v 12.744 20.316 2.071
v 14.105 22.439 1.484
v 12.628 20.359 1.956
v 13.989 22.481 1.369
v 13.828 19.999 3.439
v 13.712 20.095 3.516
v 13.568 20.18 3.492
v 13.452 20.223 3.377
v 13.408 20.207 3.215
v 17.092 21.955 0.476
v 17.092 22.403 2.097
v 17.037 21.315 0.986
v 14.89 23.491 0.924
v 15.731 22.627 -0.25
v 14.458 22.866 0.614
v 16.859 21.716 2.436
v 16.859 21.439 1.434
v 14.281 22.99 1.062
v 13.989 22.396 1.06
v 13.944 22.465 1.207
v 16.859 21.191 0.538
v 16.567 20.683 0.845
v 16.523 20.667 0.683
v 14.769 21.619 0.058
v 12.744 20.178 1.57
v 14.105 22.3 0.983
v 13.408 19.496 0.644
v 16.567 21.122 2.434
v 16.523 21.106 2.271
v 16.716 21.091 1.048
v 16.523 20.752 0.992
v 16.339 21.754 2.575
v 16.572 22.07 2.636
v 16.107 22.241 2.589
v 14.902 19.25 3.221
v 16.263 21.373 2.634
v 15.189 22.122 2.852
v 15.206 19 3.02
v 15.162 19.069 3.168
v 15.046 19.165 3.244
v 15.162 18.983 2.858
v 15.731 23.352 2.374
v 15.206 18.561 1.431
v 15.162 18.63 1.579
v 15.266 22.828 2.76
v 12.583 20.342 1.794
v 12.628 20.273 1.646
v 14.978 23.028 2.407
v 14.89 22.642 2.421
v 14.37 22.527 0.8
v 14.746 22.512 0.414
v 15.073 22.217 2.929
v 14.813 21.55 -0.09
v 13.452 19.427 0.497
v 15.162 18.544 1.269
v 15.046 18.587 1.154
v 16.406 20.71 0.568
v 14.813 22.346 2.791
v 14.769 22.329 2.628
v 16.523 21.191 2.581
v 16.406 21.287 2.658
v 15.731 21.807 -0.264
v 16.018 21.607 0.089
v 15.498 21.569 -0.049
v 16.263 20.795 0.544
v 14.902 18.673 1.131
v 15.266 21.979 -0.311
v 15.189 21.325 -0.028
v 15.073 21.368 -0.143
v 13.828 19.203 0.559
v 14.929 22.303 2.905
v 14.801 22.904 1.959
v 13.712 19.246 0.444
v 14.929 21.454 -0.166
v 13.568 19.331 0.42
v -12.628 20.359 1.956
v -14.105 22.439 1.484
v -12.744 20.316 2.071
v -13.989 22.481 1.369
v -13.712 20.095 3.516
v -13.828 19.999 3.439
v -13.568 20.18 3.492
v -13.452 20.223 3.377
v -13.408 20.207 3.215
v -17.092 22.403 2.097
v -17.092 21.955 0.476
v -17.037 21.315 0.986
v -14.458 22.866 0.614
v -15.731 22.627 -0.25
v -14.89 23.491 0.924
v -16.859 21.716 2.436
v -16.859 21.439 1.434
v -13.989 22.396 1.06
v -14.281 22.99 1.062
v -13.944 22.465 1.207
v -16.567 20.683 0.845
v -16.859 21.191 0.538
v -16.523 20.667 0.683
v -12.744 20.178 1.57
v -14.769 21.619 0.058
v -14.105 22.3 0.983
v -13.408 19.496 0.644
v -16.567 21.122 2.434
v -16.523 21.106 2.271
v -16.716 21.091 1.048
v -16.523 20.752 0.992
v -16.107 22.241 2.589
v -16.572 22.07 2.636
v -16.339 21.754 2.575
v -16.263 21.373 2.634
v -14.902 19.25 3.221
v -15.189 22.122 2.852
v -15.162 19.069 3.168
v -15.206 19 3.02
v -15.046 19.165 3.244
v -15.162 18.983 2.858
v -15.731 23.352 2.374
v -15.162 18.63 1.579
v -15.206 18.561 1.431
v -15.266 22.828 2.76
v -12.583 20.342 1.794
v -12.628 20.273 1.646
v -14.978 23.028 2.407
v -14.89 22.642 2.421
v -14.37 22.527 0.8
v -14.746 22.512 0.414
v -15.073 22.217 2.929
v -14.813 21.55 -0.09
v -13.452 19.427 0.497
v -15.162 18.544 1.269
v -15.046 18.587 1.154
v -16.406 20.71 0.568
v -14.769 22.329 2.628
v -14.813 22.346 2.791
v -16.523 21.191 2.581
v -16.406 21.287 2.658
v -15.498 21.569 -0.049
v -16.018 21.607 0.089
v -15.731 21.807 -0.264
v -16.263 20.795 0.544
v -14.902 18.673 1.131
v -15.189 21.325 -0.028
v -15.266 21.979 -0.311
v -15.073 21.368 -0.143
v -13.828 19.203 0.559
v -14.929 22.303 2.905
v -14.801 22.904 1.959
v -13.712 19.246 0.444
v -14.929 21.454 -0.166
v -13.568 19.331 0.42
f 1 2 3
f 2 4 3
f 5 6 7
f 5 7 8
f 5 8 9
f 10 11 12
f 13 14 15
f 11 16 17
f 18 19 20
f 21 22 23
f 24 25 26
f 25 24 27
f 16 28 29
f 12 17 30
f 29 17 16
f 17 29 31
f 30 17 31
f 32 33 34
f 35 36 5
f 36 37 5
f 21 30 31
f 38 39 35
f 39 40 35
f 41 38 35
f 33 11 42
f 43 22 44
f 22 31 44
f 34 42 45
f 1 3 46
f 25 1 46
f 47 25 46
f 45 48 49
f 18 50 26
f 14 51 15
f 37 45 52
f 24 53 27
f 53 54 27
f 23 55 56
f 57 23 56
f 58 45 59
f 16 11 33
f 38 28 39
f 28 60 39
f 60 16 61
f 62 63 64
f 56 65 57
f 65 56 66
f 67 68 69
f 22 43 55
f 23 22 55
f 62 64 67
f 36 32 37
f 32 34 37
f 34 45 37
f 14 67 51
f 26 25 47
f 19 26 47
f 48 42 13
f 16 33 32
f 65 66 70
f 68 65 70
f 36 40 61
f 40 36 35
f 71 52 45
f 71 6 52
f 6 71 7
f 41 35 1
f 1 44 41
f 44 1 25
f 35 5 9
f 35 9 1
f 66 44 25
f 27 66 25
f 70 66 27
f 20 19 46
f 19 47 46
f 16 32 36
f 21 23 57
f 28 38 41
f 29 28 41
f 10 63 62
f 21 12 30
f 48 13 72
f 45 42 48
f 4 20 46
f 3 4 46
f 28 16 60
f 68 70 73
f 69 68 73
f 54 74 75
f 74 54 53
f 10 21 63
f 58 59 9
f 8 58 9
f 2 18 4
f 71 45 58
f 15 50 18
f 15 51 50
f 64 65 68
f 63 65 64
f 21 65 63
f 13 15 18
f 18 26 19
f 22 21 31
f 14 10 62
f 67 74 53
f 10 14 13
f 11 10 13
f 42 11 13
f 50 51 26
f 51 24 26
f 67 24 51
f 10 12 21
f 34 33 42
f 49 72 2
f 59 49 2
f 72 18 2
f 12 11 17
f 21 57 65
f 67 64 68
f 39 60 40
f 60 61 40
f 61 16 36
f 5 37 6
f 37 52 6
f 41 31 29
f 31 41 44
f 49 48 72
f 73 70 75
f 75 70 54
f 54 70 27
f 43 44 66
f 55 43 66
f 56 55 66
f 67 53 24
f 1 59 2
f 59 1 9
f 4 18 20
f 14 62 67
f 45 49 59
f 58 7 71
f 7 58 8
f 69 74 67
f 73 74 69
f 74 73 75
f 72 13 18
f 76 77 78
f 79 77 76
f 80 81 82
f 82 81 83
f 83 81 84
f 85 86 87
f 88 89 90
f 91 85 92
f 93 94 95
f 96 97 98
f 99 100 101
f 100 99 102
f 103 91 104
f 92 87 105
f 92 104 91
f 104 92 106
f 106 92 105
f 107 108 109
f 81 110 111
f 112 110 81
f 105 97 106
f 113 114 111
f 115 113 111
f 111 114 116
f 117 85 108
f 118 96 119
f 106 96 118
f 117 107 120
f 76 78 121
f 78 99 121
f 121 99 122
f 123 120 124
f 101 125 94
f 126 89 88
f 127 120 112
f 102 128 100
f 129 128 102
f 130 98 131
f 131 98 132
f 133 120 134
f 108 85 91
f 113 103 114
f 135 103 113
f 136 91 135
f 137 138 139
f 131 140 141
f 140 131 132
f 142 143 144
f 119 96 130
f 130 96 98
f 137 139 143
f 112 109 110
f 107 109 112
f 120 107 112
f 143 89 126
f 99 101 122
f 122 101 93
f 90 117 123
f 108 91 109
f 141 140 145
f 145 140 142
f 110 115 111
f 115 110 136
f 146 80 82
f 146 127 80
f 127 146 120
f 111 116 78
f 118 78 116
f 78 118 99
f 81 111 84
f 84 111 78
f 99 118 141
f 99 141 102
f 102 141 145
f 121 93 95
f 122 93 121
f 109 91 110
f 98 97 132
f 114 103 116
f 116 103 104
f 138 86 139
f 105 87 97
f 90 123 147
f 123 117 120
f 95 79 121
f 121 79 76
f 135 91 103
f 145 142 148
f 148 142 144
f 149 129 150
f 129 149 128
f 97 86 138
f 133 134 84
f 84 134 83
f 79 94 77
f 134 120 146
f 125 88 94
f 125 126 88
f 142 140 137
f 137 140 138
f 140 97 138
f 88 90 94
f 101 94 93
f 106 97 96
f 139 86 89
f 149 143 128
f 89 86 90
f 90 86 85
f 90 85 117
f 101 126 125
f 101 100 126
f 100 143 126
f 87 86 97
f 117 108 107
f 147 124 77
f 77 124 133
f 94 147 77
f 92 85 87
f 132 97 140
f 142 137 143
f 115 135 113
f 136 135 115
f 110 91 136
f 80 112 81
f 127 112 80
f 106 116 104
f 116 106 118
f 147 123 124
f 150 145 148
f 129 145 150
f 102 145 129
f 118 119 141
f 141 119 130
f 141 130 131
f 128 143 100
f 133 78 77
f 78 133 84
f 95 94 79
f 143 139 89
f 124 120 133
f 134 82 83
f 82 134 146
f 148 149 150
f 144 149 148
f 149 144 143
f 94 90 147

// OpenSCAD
sc=(4+2*sqrt(5))/cos(16.5);
points=[[ -6.500960, -2.446784, 9.041020 ], [ -6.448337, -2.420473, 8.972136 ], [ -6.442126, -2.377901, 9.041020 ], [ -6.405765, -2.600813, 9.099853 ], [ -6.405765, -2.351589, 9.083592 ], [ -6.405765, -2.292756, 9.290243 ], [ -6.379454, -2.568291, 9.024758 ], [ -6.379454, -2.531929, 9.014708 ], [ -6.336881, -2.600813, 9.041020 ], [ -6.336881, -2.240133, 9.263932 ], [ -6.320620, -2.282706, 9.296454 ], [ -6.310570, -2.446784, 9.349077 ], [ -6.294309, -2.309017, 9.290243 ], [ -6.267997, -2.489357, 9.221360 ], [ -6.257947, -2.473096, 9.280193 ], [ -6.225425, -2.420473, 9.332816 ], [ -6.225425, -2.309017, 8.680340 ], [ -6.156541, -2.309017, 8.791796 ], [ -6.095085, -2.098936, 7.823200 ], [ -6.045085, -2.600813, 8.791796 ], [ -6.045085, -2.489357, 8.860680 ], [ -6.045085, -2.128677, 9.083592 ], [ -6.045085, -2.017221, 9.152476 ], [ -5.933629, -2.309017, 9.152476 ], [ -5.864745, -2.309017, 9.263932 ], [ -5.795085, -2.449593, 7.862712 ], [ -5.795085, -1.977458, 8.154508 ], [ -5.495085, -2.328115, 8.194021 ], [ 0.000000, -5.236068, 18.944272 ], [ 0.000000, 0.000000, 0.000000 ], [ 0.000000, 9.472136, 2.618034 ], [ 0.759017, 0.519098, -1.648936 ], [ 1.059017, 0.168441, -1.609424 ], [ 1.059017, 0.640576, -1.317627 ], [ 1.309017, 0.809017, -2.236068 ], [ 1.359017, 0.289919, -1.278115 ], [ 1.424109, 0.809017, -2.164937 ], [ 1.429134, 0.790836, -2.161831 ], [ 1.429134, 0.827198, -2.161831 ], [ 1.442290, 0.779600, -2.153701 ], [ 1.442290, 0.838434, -2.153701 ], [ 1.500000, 0.500000, -2.118034 ], [ 1.500000, 1.118034, -2.118034 ], [ 1.517385, 0.658094, -2.107290 ], [ 1.517385, 0.959940, -2.107290 ], [ 1.522410, 0.639913, -2.104184 ], [ 1.522410, 0.978121, -2.104184 ], [ 1.535565, 0.628677, -2.096053 ], [ 1.535565, 0.989357, -2.096053 ], [ 1.551827, 0.628677, -2.086003 ], [ 1.551827, 0.989357, -2.086003 ], [ 1.564982, 0.639913, -2.077873 ], [ 1.564982, 0.978121, -2.077873 ], [ 1.578138, 0.809017, -2.414161 ], [ 1.583163, 0.790836, -2.411055 ], [ 1.583163, 0.827198, -2.411055 ], [ 1.596319, 0.779600, -2.402924 ], [ 1.596319, 0.838434, -2.402924 ], [ 1.616216, 0.809017, -2.475772 ], [ 1.626266, 0.766445, -2.433200 ], [ 1.636316, 0.756395, -2.475772 ], [ 1.668838, 0.723872, -2.443250 ], [ 1.671414, 0.658094, -2.356513 ], [ 1.671414, 0.959940, -2.356513 ], [ 1.675050, 0.904212, -2.439411 ], [ 1.676439, 0.639913, -2.353408 ], [ 1.676439, 0.978121, -2.353408 ], [ 1.685100, 0.809017, -2.534606 ], [ 1.685100, 0.946784, -2.396838 ], [ 1.686489, 0.686325, -2.002778 ], [ 1.686489, 0.931709, -2.002778 ], [ 1.689594, 0.628677, -2.345277 ], [ 1.689594, 0.989357, -2.345277 ], [ 1.695150, 0.956834, -2.439411 ], [ 1.702750, 0.686325, -1.992728 ], [ 1.702750, 0.931709, -1.992728 ], [ 1.705855, 0.628677, -2.335227 ], [ 1.705855, 0.989357, -2.335227 ], [ 1.715905, 0.697561, -1.984597 ], [ 1.715905, 0.733922, -1.984597 ], [ 1.715905, 0.884112, -1.984597 ], [ 1.715905, 0.920473, -1.984597 ], [ 1.719011, 0.639913, -2.327096 ], [ 1.719011, 0.978121, -2.327096 ], [ 1.720930, 0.715741, -1.981492 ], [ 1.720930, 0.902293, -1.981492 ], [ 1.727672, 0.628677, -2.406888 ], [ 1.727672, 0.989357, -2.406888 ], [ 1.753983, 0.644938, -2.354266 ], [ 1.780295, 0.628677, -2.386788 ], [ 1.780295, 0.654988, -2.475772 ], [ 1.780295, 0.963046, -2.475772 ], [ 1.809017, 0.618034, -1.927051 ], [ 1.809017, 1.000000, -1.927051 ], [ 1.812817, 0.661200, -2.354266 ], [ 1.822867, 0.952996, -2.348055 ], [ 1.840517, 0.686325, -2.252001 ], [ 1.840517, 0.931709, -2.252001 ], [ 1.849178, 0.936734, -2.295432 ], [ 1.856778, 0.686325, -2.241951 ], [ 1.856778, 0.931709, -2.241951 ], [ 1.869934, 0.697561, -2.233821 ], [ 1.869934, 0.733922, -2.233821 ], [ 1.869934, 0.884112, -2.233821 ], [ 1.869934, 0.920473, -2.233821 ], [ 1.874959, 0.715741, -2.230715 ], [ 1.874959, 0.902293, -2.230715 ], [ 1.875490, 0.952996, -2.327955 ], [ 1.891751, 0.750183, -2.269121 ], [ 1.908012, 0.697561, -2.295432 ], [ 1.908012, 0.802806, -2.295432 ], [ 1.908012, 0.920473, -2.295432 ], [ 1.928112, 0.750183, -2.295432 ], [ 1.934323, 0.713822, -2.380577 ], [ 1.934323, 0.904212, -2.380577 ], [ 2.118034, 0.809017, -2.927051 ]];

X=9.472136;
Y=2.618034;

module strut() {
rotate ([atan2(X,Y),0,0]) scale(sc) {
color("#FFB31A") polyhedron(points,faces=[[ 55, 57, 40, 38 ],[ 44, 46, 48, 50, 52 ],[ 112, 114, 113 ],[ 60, 90, 67 ],[ 111, 114, 110 ],[ 58, 53, 54 ],[ 109, 101, 105 ],[ 62, 56, 39, 43 ],[ 111, 103, 106 ],[ 108, 110, 112 ],[ 110, 108, 102, 103, 111 ],[ 98, 95, 107 ],[ 83, 97, 70, 52 ],[ 108, 109, 102 ],[ 70, 75, 81, 85, 80 ],[ 107, 91, 114 ],[ 102, 105, 84, 79 ],[ 87, 91, 95 ],[ 39, 37, 36, 38, 40 ],[ 73, 87, 68 ],[ 59, 58, 56 ],[ 61, 90, 60 ],[ 87, 83, 77 ],[ 65, 62, 43, 45 ],[ 101, 99, 74, 78 ],[ 87, 66, 63 ],[ 114, 111, 107 ],[ 104, 106, 85, 81 ],[ 111, 104, 100 ],[ 88, 94, 89 ],[ 99, 96, 69, 74 ],[ 86, 76, 82 ],[ 105, 101, 78, 84 ],[ 89, 86, 88 ],[ 95, 98, 97, 83, 87 ],[ 86, 90, 61 ],[ 56, 54, 37, 39 ],[ 73, 67, 91 ],[ 107, 111, 98 ],[ 96, 82, 51, 69 ],[ 97, 100, 75, 70 ],[ 72, 77, 50, 48 ],[ 70, 80, 79, 69, 51, 43, 39, 40, 44, 52 ],[ 54, 53, 36, 37 ],[ 98, 111, 97 ],[ 109, 99, 101 ],[ 106, 103, 80, 85 ],[ 94, 113, 89 ],[ 112, 109, 108 ],[ 64, 67, 73 ],[ 91, 87, 73 ],[ 53, 55, 38, 36 ],[ 111, 106, 104 ],[ 82, 76, 49, 51 ],[ 71, 65, 45, 47 ],[ 109, 113, 94 ],[ 63, 66, 46, 44 ],[ 58, 57, 55 ],[ 87, 72, 66 ],[ 60, 58, 59 ],[ 59, 61, 60 ],[ 94, 88, 82, 96, 109 ],[ 67, 58, 60 ],[ 58, 54, 56 ],[ 109, 105, 102 ],[ 86, 71, 76 ],[ 89, 113, 90 ],[ 86, 65, 71 ],[ 114, 91, 67, 90, 113 ],[ 61, 59, 56, 62, 86 ],[ 113, 109, 112 ],[ 95, 91, 107 ],[ 64, 68, 63, 57, 58 ],[ 110, 114, 112 ],[ 109, 96, 99 ],[ 87, 77, 72 ],[ 88, 86, 82 ],[ 100, 104, 81, 75 ],[ 111, 100, 97 ],[ 77, 83, 52, 50 ],[ 103, 102, 79, 80 ],[ 68, 64, 73 ],[ 51, 49, 47, 45, 43 ],[ 79, 84, 78, 74, 69 ],[ 86, 62, 65 ],[ 57, 63, 44, 40 ],[ 58, 55, 53 ],[ 90, 86, 89 ],[ 68, 87, 63 ],[ 66, 72, 48, 46 ],[ 76, 71, 47, 49 ],[ 58, 67, 64 ]]);
color("#7D36D3") polyhedron(points,faces=[[ 23, 15, 12 ],[ 23, 21, 17, 20 ],[ 21, 12, 9 ],[ 20, 17, 7 ],[ 15, 23, 13 ],[ 17, 21, 4 ],[ 2, 4, 5 ],[ 5, 10, 11 ],[ 1, 17, 4 ],[ 5, 0, 2 ],[ 6, 7, 0 ],[ 7, 1, 0 ],[ 14, 13, 3 ],[ 11, 15, 14 ],[ 2, 1, 4 ],[ 9, 10, 5 ],[ 3, 11, 14 ],[ 17, 1, 7 ],[ 13, 8, 3 ],[ 4, 21, 9 ],[ 14, 15, 13 ],[ 20, 7, 8 ],[ 10, 12, 11 ],[ 23, 20, 13 ],[ 3, 6, 0 ],[ 8, 6, 3 ],[ 6, 8, 7 ],[ 4, 9, 5 ],[ 10, 9, 12 ],[ 5, 11, 3, 0 ],[ 21, 23, 12 ],[ 13, 20, 8 ],[ 12, 15, 11 ],[ 0, 1, 2 ]]);
color("#00993F") polyhedron(points,faces=[[ 31, 32, 34 ],[ 16, 22, 24, 19 ],[ 18, 16, 25 ],[ 33, 42, 93 ],[ 42, 31, 34 ],[ 92, 35, 93 ],[ 27, 26, 33, 35 ],[ 27, 24, 26 ],[ 16, 19, 25 ],[ 19, 24, 27 ],[ 32, 92, 41 ],[ 26, 22, 18 ],[ 18, 25, 32, 31 ],[ 42, 33, 31 ],[ 24, 22, 26 ],[ 26, 18, 31, 33 ],[ 92, 32, 35 ],[ 25, 27, 35, 32 ],[ 35, 33, 93 ],[ 25, 19, 27 ],[ 41, 92, 93, 42, 34 ],[ 22, 16, 18 ],[ 32, 41, 34 ]]);
}
}

difference() {
    render() {
        strut();
        scale([-1,1,1]) strut();
    }
translate([0,0,-6.9]) cube([145,160,10],center=true);
}
